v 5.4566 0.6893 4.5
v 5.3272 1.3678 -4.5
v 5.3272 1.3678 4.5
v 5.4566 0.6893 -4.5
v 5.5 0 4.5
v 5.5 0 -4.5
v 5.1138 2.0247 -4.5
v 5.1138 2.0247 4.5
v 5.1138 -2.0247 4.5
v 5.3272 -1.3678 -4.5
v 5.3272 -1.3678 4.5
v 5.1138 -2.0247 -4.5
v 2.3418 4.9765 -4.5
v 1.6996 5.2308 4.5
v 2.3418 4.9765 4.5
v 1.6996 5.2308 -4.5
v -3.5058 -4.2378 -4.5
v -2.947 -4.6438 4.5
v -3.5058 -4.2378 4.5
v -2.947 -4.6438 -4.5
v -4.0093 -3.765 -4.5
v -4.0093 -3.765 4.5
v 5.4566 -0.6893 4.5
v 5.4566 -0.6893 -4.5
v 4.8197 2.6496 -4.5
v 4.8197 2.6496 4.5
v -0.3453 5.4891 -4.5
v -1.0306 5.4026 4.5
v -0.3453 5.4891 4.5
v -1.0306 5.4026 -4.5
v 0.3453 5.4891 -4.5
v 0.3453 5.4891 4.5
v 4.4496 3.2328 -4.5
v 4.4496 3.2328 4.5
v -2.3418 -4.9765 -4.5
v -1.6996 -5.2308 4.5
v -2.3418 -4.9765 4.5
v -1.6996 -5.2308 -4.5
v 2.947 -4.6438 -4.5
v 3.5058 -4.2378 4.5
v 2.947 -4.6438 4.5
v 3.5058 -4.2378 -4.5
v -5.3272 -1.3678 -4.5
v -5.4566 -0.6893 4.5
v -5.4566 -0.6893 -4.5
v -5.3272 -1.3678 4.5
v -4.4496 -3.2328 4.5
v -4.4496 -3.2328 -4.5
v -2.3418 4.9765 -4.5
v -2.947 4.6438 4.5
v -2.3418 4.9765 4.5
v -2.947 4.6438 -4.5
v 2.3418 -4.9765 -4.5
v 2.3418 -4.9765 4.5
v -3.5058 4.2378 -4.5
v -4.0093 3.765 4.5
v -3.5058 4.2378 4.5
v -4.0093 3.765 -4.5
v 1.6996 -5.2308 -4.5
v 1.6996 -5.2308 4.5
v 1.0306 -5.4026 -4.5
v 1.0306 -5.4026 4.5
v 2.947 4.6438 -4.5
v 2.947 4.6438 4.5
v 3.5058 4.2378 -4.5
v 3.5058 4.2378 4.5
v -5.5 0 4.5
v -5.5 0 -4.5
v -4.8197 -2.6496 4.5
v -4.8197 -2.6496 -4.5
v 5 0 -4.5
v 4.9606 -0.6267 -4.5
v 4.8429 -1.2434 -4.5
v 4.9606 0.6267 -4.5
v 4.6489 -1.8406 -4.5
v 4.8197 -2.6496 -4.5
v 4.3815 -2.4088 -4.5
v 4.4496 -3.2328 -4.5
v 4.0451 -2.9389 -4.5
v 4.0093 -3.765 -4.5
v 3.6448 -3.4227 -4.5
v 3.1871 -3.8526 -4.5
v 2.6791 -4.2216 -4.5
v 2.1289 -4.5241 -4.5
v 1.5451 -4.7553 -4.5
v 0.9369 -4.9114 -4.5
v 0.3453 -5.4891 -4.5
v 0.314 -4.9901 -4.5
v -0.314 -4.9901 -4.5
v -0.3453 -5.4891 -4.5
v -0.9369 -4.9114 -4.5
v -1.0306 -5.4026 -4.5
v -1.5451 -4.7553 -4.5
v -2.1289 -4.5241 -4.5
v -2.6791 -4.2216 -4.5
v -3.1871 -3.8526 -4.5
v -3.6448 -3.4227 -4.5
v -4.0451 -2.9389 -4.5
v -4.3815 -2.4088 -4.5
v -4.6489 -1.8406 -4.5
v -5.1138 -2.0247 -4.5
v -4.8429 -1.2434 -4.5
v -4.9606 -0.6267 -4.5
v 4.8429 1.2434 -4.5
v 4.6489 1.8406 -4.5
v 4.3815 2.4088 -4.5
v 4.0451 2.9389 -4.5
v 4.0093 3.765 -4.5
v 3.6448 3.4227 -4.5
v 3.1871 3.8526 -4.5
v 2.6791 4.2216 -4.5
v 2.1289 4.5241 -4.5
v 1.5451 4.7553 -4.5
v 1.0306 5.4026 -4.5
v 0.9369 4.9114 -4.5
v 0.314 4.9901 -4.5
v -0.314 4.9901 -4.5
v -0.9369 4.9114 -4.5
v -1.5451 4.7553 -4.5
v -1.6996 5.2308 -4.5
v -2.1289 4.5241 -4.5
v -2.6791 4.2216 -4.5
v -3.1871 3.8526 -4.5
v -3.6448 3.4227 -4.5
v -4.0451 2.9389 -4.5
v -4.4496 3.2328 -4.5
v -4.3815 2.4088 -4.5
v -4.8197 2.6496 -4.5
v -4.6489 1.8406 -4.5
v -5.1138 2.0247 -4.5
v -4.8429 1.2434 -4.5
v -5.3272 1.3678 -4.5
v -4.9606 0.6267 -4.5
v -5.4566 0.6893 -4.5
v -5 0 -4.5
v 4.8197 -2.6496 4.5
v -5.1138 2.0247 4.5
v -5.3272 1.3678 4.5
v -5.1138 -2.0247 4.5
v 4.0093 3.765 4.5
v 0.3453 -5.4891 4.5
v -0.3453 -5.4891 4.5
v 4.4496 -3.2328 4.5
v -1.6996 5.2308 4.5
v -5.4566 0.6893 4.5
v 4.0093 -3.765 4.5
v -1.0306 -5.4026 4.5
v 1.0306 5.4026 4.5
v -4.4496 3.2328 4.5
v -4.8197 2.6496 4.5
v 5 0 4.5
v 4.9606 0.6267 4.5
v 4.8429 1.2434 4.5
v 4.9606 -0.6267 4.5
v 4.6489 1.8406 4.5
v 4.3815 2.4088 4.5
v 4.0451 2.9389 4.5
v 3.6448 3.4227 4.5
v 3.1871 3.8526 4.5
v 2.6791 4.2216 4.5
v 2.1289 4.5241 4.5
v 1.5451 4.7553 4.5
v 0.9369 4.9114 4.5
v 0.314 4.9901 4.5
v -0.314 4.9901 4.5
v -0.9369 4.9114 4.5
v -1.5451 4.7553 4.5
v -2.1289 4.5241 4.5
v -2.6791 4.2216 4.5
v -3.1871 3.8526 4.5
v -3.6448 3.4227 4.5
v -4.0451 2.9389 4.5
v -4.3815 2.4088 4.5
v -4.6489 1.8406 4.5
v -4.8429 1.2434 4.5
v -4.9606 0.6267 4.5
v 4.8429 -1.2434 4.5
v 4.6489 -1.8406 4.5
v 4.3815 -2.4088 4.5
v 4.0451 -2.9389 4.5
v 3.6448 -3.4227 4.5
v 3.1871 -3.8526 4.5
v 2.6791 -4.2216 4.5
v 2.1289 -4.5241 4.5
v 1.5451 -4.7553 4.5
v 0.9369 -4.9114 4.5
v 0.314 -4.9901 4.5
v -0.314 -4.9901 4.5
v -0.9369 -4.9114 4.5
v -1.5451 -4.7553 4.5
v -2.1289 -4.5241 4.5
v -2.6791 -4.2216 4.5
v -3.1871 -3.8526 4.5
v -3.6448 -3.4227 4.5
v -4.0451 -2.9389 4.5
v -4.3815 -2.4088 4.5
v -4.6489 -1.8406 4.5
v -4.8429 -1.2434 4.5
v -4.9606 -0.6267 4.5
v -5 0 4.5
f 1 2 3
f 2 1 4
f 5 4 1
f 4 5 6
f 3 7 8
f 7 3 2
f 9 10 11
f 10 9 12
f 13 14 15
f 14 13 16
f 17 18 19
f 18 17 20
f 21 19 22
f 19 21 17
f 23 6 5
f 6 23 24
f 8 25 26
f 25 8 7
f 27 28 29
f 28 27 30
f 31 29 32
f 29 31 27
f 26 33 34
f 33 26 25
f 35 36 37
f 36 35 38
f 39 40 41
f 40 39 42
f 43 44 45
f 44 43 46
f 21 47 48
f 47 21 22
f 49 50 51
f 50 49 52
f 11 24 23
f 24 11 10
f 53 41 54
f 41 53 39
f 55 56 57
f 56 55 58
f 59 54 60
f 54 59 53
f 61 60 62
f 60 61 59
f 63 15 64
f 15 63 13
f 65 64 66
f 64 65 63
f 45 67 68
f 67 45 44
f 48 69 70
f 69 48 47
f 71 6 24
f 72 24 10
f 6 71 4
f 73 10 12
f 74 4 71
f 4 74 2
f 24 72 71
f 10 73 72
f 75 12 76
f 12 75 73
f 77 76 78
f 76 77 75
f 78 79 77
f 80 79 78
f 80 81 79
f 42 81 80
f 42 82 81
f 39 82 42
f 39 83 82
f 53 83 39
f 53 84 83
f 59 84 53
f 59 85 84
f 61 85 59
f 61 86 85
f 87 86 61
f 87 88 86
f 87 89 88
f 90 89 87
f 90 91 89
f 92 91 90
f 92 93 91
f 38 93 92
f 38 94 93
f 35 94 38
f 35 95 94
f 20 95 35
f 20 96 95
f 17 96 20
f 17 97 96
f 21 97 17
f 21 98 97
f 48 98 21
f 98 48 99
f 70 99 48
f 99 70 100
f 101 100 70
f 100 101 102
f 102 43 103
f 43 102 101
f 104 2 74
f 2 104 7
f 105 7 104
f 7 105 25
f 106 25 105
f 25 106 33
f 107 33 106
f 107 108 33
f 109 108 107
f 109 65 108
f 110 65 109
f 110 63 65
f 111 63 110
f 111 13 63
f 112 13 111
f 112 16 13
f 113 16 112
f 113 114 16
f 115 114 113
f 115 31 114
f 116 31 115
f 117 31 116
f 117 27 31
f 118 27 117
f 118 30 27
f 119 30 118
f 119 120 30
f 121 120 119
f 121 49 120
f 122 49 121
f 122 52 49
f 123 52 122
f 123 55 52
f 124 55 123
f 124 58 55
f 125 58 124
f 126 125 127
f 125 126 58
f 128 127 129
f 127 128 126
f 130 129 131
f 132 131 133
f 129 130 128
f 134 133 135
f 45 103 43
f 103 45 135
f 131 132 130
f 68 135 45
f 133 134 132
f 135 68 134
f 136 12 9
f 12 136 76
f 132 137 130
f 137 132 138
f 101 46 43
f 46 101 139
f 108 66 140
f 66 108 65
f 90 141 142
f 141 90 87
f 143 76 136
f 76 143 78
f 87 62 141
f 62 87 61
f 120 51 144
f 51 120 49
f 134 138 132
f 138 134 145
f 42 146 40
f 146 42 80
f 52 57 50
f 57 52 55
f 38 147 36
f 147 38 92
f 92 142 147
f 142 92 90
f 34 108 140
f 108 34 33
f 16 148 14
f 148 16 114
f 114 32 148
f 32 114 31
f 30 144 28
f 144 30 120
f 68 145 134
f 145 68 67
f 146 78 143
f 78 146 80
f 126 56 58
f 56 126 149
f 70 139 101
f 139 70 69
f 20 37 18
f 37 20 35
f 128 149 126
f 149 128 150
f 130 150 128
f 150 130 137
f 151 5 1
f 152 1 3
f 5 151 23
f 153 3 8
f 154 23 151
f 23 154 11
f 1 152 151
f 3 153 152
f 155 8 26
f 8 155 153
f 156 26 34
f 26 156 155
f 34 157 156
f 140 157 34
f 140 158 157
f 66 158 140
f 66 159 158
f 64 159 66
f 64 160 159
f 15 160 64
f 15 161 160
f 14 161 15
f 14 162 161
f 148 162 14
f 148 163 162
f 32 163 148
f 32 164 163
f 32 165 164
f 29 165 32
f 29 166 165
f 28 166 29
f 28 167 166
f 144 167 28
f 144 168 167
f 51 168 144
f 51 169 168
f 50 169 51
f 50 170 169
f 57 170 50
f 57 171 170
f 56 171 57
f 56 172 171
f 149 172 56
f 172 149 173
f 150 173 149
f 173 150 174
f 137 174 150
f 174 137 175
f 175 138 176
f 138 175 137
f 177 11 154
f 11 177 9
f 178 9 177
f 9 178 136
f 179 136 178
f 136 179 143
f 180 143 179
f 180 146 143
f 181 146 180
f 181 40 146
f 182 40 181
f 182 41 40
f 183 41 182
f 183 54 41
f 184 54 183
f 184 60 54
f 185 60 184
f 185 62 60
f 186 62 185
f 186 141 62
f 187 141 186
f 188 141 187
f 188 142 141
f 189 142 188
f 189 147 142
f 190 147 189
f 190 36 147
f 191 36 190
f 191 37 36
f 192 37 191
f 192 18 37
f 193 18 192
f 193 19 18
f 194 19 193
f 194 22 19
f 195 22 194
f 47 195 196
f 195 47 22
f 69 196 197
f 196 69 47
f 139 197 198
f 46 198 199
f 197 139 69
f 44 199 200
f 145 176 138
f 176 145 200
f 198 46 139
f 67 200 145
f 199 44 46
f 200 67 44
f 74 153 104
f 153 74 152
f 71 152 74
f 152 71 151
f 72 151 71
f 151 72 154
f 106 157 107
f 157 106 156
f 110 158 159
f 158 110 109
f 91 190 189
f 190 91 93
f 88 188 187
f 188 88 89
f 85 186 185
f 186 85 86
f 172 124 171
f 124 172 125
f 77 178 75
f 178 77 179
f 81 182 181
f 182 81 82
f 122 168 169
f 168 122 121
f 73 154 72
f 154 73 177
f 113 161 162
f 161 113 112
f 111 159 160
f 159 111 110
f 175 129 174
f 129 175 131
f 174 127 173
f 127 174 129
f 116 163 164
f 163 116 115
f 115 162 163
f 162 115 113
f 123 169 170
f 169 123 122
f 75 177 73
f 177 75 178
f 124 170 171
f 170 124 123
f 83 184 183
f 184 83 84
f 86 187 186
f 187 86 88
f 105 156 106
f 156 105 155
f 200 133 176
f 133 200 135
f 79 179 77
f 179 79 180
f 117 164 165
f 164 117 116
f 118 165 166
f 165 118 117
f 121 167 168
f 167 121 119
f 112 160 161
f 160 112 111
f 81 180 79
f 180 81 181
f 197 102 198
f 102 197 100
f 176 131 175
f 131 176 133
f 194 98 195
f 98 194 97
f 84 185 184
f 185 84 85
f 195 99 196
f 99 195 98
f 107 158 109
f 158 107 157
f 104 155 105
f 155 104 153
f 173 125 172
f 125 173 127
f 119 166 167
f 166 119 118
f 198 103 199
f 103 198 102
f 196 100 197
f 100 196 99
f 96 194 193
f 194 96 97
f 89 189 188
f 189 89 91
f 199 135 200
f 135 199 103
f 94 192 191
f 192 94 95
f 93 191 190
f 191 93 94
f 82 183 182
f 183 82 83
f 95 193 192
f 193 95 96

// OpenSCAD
$fn = 50;


difference() {
	union() {
		translate(v = [0, 0, -4.5000000000]) {
			cylinder(h = 9, r = 5.5000000000);
		}
	}
	union() {
		translate(v = [0, 0, -100.0000000000]) {
			cylinder(h = 200, r = 5.0000000000);
		}
	}
}
